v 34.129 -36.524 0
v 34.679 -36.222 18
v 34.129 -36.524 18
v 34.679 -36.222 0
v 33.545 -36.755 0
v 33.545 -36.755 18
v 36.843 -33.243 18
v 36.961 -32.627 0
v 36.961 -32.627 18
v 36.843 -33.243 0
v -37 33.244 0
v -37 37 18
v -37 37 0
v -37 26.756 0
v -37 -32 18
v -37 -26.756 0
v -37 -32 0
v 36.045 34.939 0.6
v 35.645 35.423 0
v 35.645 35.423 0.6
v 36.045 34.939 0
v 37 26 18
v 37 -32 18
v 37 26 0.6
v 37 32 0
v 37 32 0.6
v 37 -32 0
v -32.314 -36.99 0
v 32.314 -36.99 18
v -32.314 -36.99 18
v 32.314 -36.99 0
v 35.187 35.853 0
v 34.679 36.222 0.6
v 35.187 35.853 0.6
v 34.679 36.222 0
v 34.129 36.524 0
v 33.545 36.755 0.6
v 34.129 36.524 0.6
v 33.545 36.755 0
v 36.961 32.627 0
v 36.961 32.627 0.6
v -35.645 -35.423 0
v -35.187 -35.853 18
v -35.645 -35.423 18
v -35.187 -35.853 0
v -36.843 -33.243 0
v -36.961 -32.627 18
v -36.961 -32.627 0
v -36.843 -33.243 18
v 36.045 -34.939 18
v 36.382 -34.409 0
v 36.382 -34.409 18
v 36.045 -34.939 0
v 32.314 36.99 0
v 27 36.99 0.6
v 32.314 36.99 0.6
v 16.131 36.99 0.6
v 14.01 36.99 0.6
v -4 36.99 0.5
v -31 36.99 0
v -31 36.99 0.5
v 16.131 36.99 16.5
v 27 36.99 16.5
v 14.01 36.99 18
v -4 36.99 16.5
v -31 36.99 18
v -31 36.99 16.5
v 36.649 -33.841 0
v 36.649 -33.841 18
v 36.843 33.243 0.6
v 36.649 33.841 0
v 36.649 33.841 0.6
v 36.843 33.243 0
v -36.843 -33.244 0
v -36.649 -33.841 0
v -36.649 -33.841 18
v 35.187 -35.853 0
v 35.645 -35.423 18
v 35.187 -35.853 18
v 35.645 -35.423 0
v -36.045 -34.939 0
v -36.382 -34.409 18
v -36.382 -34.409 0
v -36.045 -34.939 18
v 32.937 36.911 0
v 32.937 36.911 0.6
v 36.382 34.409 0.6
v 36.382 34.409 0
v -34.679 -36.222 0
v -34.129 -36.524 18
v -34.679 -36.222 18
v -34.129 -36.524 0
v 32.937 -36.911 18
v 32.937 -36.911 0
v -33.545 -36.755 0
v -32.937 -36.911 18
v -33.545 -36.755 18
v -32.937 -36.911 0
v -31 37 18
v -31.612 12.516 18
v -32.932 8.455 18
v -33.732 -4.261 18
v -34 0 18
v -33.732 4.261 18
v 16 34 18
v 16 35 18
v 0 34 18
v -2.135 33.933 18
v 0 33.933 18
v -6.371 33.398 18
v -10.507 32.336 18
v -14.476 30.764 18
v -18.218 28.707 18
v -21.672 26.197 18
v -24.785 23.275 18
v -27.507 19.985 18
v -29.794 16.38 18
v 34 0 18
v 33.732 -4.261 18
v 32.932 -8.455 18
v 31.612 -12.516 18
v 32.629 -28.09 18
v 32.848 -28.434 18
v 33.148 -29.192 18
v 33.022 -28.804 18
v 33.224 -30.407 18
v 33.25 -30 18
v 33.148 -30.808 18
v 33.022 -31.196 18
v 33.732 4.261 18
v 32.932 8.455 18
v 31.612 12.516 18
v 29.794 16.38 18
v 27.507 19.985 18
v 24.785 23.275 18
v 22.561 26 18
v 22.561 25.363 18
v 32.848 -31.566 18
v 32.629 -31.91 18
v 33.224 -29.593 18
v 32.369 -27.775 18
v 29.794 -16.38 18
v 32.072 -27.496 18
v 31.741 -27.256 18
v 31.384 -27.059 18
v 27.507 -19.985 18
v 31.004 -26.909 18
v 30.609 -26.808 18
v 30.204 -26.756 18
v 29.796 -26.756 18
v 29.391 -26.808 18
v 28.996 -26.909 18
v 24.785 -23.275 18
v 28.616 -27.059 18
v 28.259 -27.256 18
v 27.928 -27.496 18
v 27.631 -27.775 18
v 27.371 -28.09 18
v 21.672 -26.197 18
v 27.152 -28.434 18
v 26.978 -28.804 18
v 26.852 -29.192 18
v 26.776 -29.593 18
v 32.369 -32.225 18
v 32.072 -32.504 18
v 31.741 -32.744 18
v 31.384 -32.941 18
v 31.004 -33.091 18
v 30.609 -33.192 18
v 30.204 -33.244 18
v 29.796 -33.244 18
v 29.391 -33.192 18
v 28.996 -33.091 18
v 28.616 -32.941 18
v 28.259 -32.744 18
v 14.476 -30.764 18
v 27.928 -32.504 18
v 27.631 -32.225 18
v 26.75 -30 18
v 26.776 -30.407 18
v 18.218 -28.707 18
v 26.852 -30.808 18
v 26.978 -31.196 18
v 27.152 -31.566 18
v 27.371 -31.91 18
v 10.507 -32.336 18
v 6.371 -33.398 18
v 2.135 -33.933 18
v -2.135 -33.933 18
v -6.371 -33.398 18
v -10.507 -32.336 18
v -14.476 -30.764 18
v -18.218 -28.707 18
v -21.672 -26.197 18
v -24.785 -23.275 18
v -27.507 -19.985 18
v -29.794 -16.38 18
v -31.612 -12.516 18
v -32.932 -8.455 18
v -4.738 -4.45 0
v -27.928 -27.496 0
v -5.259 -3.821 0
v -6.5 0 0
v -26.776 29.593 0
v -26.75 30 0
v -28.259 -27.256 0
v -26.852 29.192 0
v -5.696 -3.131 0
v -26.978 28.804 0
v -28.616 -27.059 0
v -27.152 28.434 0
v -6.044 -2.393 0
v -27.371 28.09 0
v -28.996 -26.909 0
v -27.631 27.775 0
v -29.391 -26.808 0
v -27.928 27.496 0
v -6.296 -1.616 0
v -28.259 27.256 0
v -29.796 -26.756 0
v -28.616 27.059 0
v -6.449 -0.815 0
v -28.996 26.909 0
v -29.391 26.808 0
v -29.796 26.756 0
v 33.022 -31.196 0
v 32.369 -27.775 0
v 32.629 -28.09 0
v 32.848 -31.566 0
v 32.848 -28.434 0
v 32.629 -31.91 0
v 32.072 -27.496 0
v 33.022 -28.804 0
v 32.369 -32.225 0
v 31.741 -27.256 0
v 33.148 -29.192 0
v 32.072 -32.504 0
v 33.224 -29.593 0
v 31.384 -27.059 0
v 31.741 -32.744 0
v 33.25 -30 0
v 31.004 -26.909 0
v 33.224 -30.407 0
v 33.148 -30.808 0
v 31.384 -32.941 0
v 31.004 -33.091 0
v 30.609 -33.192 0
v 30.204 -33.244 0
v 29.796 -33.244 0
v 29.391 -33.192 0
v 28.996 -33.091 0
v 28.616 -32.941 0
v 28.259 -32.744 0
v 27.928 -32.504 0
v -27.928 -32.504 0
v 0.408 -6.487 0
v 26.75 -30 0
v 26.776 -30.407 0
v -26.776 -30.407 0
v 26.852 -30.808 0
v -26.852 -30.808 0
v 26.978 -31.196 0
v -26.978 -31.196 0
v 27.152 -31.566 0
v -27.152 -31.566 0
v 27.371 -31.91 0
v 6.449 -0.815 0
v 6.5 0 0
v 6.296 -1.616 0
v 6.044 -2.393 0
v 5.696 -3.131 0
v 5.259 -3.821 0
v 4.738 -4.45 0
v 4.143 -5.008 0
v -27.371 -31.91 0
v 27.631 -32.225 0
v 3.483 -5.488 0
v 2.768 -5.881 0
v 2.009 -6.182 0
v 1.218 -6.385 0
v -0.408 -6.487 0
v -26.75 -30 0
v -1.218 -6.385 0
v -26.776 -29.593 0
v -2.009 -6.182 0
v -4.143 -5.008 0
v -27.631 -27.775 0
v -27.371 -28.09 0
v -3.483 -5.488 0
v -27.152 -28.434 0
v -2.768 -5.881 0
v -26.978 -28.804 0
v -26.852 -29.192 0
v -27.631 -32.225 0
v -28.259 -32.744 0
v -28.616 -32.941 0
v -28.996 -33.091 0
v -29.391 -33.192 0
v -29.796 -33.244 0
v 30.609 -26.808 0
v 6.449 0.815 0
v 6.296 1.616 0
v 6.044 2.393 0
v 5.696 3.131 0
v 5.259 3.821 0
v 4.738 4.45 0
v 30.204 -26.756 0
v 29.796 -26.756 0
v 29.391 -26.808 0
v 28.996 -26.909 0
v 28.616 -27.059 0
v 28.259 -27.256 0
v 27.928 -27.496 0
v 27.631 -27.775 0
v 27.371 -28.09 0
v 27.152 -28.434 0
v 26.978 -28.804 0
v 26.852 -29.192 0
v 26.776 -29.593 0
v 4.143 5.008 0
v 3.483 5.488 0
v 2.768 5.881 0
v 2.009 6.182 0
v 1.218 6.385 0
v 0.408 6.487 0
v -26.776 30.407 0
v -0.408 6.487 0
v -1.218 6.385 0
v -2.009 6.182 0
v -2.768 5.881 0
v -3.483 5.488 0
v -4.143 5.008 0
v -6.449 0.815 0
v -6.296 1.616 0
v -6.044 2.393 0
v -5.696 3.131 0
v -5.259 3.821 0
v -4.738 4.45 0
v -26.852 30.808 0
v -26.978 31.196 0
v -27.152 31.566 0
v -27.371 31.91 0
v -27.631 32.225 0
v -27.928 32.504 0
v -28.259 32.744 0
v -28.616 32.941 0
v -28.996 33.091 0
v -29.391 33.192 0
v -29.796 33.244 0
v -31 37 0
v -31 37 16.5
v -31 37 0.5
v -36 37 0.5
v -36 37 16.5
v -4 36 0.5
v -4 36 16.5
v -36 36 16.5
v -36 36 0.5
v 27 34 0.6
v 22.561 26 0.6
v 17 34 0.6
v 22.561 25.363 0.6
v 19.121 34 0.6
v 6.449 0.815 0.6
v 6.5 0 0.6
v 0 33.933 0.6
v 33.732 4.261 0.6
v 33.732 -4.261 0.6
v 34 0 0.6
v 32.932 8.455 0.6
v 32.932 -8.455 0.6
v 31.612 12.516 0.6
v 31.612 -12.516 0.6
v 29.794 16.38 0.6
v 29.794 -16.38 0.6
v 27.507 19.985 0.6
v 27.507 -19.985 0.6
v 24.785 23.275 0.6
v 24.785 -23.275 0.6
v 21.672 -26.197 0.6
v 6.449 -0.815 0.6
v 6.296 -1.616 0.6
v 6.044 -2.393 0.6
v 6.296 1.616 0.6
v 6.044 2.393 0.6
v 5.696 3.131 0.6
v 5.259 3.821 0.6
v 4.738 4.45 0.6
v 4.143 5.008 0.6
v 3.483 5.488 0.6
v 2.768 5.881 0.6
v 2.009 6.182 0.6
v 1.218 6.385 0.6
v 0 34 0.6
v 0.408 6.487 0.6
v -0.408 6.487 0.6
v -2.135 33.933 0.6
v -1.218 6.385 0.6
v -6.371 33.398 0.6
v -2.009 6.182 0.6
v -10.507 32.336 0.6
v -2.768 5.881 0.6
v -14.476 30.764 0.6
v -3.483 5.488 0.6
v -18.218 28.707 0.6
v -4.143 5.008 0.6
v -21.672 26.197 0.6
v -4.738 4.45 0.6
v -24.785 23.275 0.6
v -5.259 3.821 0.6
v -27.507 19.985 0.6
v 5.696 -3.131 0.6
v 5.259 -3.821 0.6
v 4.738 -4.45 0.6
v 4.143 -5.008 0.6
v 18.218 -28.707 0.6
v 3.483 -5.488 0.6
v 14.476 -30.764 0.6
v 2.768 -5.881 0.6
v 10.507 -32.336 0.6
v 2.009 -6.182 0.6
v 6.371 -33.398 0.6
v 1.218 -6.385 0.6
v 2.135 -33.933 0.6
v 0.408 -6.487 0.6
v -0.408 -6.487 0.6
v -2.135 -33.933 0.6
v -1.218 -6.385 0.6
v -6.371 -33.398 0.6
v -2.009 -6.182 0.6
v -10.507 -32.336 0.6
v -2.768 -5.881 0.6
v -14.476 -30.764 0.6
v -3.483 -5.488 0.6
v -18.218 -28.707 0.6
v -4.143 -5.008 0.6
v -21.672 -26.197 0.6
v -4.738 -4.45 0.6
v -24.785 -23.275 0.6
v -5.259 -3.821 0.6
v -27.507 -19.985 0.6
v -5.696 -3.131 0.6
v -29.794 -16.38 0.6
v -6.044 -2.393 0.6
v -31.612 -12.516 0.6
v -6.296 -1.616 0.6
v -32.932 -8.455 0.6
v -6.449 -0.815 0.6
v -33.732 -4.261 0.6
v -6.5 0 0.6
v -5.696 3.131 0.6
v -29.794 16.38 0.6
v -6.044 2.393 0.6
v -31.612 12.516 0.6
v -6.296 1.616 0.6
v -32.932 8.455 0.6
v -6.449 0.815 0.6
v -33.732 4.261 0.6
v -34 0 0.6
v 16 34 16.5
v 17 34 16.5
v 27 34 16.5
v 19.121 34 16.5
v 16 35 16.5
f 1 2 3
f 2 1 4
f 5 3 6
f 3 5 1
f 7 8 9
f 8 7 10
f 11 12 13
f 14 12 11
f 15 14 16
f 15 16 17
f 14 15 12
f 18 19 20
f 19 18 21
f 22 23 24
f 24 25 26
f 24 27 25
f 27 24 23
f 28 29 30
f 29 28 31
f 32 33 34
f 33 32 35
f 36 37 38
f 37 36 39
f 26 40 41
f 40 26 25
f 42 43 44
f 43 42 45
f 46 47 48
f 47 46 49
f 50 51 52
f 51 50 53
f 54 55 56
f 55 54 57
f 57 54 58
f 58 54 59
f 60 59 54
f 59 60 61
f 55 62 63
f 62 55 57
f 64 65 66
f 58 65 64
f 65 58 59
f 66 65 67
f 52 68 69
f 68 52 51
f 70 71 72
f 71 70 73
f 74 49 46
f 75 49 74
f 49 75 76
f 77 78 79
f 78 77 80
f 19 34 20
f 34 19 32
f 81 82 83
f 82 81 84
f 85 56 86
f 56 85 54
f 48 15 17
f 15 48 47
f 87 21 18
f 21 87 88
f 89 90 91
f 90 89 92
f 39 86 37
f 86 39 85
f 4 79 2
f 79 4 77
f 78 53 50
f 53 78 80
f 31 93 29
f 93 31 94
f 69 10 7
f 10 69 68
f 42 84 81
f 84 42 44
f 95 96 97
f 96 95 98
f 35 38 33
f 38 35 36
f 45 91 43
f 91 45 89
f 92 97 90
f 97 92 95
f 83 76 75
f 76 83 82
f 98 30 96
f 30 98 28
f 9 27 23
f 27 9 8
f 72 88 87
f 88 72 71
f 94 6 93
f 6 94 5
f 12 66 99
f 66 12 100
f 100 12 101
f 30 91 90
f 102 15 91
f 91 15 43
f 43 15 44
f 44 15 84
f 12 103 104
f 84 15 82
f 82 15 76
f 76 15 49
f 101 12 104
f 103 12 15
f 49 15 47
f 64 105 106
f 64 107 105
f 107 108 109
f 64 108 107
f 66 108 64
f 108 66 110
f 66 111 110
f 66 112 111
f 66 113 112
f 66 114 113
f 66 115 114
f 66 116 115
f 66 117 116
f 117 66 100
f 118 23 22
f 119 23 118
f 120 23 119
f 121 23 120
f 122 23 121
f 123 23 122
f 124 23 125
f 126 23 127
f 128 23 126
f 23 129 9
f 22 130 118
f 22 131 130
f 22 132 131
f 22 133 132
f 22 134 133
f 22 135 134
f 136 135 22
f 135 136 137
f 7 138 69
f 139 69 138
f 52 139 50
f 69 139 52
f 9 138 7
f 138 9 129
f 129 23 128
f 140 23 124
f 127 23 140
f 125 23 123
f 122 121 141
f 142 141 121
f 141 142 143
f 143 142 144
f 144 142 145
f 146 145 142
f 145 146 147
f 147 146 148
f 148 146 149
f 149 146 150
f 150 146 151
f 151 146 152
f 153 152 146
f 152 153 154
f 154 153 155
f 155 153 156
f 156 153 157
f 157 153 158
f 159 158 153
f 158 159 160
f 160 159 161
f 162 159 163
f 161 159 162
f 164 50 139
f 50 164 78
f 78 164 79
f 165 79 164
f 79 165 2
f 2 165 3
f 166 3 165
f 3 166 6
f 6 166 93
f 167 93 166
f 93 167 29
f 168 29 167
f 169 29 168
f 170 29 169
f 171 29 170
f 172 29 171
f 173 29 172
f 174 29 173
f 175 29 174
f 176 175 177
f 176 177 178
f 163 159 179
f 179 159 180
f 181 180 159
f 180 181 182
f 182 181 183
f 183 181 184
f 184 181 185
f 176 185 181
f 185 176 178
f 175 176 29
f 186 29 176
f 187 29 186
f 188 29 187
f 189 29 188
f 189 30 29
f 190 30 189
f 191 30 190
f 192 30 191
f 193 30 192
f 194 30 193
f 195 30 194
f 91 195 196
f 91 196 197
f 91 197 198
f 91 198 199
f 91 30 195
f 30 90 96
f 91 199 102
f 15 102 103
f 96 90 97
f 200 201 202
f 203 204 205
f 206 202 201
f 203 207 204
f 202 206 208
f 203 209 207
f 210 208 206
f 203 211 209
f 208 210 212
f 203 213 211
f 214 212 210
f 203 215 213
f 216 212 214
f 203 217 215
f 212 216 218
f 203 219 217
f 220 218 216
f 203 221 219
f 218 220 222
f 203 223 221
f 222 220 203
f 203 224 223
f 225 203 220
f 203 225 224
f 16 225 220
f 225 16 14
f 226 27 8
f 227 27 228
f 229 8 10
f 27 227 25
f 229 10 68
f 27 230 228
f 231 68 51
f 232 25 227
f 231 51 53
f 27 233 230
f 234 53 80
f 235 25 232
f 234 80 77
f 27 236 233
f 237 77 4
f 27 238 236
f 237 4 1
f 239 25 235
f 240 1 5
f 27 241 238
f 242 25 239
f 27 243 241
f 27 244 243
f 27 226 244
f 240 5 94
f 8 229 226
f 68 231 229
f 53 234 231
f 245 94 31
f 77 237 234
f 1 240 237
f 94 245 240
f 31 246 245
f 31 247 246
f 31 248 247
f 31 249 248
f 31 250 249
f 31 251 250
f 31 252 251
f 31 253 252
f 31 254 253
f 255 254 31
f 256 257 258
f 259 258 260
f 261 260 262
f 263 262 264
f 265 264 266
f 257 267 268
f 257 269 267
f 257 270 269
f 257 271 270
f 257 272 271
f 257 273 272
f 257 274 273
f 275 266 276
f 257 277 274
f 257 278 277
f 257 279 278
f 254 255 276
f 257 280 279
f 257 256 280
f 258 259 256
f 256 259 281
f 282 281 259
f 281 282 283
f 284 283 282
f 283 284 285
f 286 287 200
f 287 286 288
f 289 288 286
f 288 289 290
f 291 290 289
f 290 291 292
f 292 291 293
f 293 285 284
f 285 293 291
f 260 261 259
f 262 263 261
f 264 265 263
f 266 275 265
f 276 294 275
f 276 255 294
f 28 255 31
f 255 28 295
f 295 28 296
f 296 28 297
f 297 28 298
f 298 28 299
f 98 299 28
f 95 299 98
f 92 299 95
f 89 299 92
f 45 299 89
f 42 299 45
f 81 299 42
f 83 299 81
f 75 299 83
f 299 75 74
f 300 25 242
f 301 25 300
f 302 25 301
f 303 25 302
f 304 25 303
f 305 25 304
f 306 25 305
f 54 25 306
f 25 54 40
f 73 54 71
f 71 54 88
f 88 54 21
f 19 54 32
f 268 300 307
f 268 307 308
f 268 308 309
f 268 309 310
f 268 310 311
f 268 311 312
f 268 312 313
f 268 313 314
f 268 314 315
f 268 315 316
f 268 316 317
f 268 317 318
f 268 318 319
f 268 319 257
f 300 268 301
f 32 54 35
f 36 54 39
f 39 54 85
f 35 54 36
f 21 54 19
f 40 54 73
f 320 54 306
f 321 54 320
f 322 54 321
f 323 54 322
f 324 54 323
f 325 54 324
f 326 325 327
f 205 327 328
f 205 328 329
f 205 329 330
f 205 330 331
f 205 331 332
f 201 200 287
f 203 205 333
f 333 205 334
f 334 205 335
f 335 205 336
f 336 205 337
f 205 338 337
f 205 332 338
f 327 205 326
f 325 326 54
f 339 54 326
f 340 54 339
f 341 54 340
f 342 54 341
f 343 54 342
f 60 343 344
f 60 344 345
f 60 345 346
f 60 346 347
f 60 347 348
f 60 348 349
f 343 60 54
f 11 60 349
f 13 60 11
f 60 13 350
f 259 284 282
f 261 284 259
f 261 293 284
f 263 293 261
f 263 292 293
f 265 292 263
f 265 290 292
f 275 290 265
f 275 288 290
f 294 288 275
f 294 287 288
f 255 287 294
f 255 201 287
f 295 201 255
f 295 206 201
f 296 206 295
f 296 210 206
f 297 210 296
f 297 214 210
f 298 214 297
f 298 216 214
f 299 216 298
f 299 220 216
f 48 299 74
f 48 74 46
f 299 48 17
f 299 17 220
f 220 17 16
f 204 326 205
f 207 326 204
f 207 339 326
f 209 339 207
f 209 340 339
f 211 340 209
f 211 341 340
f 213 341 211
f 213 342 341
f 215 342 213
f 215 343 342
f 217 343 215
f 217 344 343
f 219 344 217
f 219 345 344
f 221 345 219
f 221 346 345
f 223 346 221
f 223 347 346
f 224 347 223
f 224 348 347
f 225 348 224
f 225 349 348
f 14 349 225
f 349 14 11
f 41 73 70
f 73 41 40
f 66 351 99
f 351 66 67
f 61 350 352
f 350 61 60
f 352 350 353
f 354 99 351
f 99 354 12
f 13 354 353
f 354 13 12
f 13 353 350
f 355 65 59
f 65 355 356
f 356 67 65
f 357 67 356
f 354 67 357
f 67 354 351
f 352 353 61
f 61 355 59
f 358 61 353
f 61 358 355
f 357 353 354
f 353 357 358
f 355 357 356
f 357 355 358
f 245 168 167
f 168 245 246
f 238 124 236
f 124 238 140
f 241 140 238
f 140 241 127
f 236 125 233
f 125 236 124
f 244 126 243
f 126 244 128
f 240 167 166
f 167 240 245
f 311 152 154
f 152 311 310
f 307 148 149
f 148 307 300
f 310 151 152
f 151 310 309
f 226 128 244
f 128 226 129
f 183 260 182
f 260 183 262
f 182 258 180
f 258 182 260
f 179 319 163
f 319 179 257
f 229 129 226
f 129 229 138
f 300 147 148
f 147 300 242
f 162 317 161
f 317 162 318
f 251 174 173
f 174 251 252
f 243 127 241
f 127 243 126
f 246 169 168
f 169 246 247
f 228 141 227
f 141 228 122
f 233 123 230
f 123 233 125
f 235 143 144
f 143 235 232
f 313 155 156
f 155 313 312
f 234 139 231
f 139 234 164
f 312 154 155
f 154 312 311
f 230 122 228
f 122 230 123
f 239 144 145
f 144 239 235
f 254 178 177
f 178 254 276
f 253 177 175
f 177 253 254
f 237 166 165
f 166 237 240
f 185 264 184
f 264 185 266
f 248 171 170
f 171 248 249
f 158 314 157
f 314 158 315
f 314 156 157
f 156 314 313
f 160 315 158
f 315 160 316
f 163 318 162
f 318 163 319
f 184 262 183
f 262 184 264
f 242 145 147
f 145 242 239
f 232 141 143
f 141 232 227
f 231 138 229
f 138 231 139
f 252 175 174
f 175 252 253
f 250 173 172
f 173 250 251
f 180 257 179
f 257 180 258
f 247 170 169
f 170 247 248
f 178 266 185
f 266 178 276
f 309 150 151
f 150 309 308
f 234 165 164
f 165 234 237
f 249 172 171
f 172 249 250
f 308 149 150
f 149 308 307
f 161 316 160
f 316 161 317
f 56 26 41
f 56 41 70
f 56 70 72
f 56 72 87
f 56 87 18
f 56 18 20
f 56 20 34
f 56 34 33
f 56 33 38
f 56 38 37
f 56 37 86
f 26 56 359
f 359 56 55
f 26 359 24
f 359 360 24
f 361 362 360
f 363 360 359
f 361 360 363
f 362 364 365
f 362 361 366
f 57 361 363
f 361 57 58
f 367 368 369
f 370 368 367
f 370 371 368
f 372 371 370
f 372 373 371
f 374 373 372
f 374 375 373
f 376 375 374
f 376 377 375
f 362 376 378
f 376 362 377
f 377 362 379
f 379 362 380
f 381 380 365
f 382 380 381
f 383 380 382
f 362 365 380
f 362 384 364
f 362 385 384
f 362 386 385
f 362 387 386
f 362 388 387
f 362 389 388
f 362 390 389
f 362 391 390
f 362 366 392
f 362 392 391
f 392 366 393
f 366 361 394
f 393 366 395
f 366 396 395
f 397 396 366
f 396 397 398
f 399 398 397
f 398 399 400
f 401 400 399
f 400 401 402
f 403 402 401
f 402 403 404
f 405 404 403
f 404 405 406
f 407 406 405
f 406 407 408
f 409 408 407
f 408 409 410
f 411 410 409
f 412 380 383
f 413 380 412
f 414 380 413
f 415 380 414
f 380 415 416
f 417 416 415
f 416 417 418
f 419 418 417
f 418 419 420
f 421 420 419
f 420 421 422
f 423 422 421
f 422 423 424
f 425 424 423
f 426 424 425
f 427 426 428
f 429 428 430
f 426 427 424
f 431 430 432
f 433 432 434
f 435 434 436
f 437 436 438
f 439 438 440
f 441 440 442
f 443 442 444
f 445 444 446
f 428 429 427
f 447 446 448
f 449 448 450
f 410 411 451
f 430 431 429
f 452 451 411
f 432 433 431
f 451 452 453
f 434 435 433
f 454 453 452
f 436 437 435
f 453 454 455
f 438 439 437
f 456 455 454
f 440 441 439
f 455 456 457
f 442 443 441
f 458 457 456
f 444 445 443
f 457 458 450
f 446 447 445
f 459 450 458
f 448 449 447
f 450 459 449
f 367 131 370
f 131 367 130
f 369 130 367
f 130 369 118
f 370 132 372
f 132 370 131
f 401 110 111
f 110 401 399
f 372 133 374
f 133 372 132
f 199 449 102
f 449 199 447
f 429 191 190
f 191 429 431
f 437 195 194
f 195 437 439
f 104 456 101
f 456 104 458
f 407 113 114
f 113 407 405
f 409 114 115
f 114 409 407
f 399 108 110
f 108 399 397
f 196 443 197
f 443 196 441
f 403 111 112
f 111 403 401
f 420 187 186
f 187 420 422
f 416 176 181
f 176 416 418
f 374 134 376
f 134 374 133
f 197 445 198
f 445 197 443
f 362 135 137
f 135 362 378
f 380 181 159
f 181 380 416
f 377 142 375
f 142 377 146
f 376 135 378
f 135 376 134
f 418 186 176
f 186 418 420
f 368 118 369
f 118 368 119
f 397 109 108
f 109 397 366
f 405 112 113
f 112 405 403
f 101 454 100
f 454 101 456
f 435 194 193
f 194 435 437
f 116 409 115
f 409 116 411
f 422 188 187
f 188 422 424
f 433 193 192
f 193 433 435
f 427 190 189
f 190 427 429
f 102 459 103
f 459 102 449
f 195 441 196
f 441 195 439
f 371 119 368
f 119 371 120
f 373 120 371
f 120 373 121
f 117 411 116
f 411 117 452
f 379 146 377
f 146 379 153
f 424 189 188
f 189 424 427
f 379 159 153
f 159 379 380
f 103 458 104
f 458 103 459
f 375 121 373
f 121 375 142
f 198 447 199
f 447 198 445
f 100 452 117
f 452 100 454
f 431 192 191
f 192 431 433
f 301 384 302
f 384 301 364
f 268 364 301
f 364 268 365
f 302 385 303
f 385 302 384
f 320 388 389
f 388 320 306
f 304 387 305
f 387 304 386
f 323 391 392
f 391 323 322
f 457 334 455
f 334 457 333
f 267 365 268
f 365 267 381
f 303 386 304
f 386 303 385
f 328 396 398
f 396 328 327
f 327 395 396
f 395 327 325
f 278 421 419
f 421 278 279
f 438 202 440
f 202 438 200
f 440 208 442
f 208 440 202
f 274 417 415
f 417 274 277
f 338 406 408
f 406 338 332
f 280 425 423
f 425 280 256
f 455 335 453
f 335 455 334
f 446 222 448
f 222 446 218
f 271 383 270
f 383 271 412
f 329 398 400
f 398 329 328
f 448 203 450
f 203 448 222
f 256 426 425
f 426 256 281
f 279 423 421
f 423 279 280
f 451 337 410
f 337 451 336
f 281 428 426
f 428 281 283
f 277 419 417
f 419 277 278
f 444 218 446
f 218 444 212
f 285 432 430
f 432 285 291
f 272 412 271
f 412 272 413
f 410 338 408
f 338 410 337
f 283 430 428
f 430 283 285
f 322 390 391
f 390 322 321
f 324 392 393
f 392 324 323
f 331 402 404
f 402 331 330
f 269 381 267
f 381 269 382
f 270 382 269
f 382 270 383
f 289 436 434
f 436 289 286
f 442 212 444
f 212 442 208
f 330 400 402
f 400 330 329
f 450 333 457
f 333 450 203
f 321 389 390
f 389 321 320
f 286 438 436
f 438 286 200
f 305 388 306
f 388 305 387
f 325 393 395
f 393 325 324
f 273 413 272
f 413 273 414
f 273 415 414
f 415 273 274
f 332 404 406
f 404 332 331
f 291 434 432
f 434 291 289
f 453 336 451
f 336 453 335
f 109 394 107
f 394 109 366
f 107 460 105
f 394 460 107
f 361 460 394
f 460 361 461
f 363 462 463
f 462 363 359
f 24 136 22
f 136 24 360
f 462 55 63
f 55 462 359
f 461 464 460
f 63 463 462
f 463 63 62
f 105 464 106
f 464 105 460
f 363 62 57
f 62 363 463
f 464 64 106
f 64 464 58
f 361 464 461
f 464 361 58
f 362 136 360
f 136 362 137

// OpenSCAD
$fn = 50;


difference() {
	union() {
		hull() {
			translate(v = [-32.0000000000, 32.0000000000, 0]) {
				cylinder(h = 18, r = 5);
			}
			translate(v = [32.0000000000, 32.0000000000, 0]) {
				cylinder(h = 18, r = 5);
			}
			translate(v = [-32.0000000000, -32.0000000000, 0]) {
				cylinder(h = 18, r = 5);
			}
			translate(v = [32.0000000000, -32.0000000000, 0]) {
				cylinder(h = 18, r = 5);
			}
		}
		translate(v = [-37.0000000000, 31.0000000000, 0]) {
			cube(size = [6, 6, 18]);
		}
	}
	union() {
		translate(v = [-37.5000000000, -30.0000000000, -250.0000000000]) {
			rotate(a = [0, 0, 0]) {
				difference() {
					union() {
						hull() {
							translate(v = [7.5000000000, 0, 0]) {
								cylinder(h = 250, r = 3.2500000000, r1 = 3.2500000000, r2 = 3.2500000000);
							}
							translate(v = [-7.5000000000, 0, 0]) {
								cylinder(h = 250, r = 3.2500000000, r1 = 3.2500000000, r2 = 3.2500000000);
							}
						}
					}
					union();
				}
			}
		}
		translate(v = [-37.5000000000, 30.0000000000, -250.0000000000]) {
			rotate(a = [0, 0, 0]) {
				difference() {
					union() {
						hull() {
							translate(v = [7.5000000000, 0, 0]) {
								cylinder(h = 250, r = 3.2500000000, r1 = 3.2500000000, r2 = 3.2500000000);
							}
							translate(v = [-7.5000000000, 0, 0]) {
								cylinder(h = 250, r = 3.2500000000, r1 = 3.2500000000, r2 = 3.2500000000);
							}
						}
					}
					union();
				}
			}
		}
		translate(v = [-36.0000000000, 36.0000000000, 0.5000000000]) {
			cube(size = [32, 1, 16]);
		}
		translate(v = [30.0000000000, -30.0000000000, -50.0000000000]) {
			cylinder(h = 100, r = 3.2500000000);
		}
		translate(v = [0, 0, 0.6000000000]) {
			cylinder(h = 20.4000000000, r = 34.0000000000);
		}
		translate(v = [0, 0, -9.0000000000]) {
			cylinder(h = 18, r = 6.5000000000);
		}
		translate(v = [0.0000000000, 26.0000000000, 0.6000000000]) {
			cube(size = [37.0000000000, 8, 20.4000000000]);
		}
		translate(v = [27.0000000000, 26.0000000000, 0.6000000000]) {
			cube(size = [10, 11, 20.4000000000]);
		}
		translate(v = [16.0000000000, 26.0000000000, 16.5000000000]) {
			cube(size = [21, 11, 1.5000000000]);
		}
		translate(v = [13.2500000000, 37.7500000000, 0.6000000000]) {
			rotate(a = [0, 0, -45]) {
				cube(size = [7.5000000000, 1.5000000000, 20.4000000000]);
			}
		}
		translate(v = [15.0610000000, 24.0000000000, 0.6000000000]) {
			cube(size = [7.5000000000, 2, 17.4000000000]);
		}
	}
}
